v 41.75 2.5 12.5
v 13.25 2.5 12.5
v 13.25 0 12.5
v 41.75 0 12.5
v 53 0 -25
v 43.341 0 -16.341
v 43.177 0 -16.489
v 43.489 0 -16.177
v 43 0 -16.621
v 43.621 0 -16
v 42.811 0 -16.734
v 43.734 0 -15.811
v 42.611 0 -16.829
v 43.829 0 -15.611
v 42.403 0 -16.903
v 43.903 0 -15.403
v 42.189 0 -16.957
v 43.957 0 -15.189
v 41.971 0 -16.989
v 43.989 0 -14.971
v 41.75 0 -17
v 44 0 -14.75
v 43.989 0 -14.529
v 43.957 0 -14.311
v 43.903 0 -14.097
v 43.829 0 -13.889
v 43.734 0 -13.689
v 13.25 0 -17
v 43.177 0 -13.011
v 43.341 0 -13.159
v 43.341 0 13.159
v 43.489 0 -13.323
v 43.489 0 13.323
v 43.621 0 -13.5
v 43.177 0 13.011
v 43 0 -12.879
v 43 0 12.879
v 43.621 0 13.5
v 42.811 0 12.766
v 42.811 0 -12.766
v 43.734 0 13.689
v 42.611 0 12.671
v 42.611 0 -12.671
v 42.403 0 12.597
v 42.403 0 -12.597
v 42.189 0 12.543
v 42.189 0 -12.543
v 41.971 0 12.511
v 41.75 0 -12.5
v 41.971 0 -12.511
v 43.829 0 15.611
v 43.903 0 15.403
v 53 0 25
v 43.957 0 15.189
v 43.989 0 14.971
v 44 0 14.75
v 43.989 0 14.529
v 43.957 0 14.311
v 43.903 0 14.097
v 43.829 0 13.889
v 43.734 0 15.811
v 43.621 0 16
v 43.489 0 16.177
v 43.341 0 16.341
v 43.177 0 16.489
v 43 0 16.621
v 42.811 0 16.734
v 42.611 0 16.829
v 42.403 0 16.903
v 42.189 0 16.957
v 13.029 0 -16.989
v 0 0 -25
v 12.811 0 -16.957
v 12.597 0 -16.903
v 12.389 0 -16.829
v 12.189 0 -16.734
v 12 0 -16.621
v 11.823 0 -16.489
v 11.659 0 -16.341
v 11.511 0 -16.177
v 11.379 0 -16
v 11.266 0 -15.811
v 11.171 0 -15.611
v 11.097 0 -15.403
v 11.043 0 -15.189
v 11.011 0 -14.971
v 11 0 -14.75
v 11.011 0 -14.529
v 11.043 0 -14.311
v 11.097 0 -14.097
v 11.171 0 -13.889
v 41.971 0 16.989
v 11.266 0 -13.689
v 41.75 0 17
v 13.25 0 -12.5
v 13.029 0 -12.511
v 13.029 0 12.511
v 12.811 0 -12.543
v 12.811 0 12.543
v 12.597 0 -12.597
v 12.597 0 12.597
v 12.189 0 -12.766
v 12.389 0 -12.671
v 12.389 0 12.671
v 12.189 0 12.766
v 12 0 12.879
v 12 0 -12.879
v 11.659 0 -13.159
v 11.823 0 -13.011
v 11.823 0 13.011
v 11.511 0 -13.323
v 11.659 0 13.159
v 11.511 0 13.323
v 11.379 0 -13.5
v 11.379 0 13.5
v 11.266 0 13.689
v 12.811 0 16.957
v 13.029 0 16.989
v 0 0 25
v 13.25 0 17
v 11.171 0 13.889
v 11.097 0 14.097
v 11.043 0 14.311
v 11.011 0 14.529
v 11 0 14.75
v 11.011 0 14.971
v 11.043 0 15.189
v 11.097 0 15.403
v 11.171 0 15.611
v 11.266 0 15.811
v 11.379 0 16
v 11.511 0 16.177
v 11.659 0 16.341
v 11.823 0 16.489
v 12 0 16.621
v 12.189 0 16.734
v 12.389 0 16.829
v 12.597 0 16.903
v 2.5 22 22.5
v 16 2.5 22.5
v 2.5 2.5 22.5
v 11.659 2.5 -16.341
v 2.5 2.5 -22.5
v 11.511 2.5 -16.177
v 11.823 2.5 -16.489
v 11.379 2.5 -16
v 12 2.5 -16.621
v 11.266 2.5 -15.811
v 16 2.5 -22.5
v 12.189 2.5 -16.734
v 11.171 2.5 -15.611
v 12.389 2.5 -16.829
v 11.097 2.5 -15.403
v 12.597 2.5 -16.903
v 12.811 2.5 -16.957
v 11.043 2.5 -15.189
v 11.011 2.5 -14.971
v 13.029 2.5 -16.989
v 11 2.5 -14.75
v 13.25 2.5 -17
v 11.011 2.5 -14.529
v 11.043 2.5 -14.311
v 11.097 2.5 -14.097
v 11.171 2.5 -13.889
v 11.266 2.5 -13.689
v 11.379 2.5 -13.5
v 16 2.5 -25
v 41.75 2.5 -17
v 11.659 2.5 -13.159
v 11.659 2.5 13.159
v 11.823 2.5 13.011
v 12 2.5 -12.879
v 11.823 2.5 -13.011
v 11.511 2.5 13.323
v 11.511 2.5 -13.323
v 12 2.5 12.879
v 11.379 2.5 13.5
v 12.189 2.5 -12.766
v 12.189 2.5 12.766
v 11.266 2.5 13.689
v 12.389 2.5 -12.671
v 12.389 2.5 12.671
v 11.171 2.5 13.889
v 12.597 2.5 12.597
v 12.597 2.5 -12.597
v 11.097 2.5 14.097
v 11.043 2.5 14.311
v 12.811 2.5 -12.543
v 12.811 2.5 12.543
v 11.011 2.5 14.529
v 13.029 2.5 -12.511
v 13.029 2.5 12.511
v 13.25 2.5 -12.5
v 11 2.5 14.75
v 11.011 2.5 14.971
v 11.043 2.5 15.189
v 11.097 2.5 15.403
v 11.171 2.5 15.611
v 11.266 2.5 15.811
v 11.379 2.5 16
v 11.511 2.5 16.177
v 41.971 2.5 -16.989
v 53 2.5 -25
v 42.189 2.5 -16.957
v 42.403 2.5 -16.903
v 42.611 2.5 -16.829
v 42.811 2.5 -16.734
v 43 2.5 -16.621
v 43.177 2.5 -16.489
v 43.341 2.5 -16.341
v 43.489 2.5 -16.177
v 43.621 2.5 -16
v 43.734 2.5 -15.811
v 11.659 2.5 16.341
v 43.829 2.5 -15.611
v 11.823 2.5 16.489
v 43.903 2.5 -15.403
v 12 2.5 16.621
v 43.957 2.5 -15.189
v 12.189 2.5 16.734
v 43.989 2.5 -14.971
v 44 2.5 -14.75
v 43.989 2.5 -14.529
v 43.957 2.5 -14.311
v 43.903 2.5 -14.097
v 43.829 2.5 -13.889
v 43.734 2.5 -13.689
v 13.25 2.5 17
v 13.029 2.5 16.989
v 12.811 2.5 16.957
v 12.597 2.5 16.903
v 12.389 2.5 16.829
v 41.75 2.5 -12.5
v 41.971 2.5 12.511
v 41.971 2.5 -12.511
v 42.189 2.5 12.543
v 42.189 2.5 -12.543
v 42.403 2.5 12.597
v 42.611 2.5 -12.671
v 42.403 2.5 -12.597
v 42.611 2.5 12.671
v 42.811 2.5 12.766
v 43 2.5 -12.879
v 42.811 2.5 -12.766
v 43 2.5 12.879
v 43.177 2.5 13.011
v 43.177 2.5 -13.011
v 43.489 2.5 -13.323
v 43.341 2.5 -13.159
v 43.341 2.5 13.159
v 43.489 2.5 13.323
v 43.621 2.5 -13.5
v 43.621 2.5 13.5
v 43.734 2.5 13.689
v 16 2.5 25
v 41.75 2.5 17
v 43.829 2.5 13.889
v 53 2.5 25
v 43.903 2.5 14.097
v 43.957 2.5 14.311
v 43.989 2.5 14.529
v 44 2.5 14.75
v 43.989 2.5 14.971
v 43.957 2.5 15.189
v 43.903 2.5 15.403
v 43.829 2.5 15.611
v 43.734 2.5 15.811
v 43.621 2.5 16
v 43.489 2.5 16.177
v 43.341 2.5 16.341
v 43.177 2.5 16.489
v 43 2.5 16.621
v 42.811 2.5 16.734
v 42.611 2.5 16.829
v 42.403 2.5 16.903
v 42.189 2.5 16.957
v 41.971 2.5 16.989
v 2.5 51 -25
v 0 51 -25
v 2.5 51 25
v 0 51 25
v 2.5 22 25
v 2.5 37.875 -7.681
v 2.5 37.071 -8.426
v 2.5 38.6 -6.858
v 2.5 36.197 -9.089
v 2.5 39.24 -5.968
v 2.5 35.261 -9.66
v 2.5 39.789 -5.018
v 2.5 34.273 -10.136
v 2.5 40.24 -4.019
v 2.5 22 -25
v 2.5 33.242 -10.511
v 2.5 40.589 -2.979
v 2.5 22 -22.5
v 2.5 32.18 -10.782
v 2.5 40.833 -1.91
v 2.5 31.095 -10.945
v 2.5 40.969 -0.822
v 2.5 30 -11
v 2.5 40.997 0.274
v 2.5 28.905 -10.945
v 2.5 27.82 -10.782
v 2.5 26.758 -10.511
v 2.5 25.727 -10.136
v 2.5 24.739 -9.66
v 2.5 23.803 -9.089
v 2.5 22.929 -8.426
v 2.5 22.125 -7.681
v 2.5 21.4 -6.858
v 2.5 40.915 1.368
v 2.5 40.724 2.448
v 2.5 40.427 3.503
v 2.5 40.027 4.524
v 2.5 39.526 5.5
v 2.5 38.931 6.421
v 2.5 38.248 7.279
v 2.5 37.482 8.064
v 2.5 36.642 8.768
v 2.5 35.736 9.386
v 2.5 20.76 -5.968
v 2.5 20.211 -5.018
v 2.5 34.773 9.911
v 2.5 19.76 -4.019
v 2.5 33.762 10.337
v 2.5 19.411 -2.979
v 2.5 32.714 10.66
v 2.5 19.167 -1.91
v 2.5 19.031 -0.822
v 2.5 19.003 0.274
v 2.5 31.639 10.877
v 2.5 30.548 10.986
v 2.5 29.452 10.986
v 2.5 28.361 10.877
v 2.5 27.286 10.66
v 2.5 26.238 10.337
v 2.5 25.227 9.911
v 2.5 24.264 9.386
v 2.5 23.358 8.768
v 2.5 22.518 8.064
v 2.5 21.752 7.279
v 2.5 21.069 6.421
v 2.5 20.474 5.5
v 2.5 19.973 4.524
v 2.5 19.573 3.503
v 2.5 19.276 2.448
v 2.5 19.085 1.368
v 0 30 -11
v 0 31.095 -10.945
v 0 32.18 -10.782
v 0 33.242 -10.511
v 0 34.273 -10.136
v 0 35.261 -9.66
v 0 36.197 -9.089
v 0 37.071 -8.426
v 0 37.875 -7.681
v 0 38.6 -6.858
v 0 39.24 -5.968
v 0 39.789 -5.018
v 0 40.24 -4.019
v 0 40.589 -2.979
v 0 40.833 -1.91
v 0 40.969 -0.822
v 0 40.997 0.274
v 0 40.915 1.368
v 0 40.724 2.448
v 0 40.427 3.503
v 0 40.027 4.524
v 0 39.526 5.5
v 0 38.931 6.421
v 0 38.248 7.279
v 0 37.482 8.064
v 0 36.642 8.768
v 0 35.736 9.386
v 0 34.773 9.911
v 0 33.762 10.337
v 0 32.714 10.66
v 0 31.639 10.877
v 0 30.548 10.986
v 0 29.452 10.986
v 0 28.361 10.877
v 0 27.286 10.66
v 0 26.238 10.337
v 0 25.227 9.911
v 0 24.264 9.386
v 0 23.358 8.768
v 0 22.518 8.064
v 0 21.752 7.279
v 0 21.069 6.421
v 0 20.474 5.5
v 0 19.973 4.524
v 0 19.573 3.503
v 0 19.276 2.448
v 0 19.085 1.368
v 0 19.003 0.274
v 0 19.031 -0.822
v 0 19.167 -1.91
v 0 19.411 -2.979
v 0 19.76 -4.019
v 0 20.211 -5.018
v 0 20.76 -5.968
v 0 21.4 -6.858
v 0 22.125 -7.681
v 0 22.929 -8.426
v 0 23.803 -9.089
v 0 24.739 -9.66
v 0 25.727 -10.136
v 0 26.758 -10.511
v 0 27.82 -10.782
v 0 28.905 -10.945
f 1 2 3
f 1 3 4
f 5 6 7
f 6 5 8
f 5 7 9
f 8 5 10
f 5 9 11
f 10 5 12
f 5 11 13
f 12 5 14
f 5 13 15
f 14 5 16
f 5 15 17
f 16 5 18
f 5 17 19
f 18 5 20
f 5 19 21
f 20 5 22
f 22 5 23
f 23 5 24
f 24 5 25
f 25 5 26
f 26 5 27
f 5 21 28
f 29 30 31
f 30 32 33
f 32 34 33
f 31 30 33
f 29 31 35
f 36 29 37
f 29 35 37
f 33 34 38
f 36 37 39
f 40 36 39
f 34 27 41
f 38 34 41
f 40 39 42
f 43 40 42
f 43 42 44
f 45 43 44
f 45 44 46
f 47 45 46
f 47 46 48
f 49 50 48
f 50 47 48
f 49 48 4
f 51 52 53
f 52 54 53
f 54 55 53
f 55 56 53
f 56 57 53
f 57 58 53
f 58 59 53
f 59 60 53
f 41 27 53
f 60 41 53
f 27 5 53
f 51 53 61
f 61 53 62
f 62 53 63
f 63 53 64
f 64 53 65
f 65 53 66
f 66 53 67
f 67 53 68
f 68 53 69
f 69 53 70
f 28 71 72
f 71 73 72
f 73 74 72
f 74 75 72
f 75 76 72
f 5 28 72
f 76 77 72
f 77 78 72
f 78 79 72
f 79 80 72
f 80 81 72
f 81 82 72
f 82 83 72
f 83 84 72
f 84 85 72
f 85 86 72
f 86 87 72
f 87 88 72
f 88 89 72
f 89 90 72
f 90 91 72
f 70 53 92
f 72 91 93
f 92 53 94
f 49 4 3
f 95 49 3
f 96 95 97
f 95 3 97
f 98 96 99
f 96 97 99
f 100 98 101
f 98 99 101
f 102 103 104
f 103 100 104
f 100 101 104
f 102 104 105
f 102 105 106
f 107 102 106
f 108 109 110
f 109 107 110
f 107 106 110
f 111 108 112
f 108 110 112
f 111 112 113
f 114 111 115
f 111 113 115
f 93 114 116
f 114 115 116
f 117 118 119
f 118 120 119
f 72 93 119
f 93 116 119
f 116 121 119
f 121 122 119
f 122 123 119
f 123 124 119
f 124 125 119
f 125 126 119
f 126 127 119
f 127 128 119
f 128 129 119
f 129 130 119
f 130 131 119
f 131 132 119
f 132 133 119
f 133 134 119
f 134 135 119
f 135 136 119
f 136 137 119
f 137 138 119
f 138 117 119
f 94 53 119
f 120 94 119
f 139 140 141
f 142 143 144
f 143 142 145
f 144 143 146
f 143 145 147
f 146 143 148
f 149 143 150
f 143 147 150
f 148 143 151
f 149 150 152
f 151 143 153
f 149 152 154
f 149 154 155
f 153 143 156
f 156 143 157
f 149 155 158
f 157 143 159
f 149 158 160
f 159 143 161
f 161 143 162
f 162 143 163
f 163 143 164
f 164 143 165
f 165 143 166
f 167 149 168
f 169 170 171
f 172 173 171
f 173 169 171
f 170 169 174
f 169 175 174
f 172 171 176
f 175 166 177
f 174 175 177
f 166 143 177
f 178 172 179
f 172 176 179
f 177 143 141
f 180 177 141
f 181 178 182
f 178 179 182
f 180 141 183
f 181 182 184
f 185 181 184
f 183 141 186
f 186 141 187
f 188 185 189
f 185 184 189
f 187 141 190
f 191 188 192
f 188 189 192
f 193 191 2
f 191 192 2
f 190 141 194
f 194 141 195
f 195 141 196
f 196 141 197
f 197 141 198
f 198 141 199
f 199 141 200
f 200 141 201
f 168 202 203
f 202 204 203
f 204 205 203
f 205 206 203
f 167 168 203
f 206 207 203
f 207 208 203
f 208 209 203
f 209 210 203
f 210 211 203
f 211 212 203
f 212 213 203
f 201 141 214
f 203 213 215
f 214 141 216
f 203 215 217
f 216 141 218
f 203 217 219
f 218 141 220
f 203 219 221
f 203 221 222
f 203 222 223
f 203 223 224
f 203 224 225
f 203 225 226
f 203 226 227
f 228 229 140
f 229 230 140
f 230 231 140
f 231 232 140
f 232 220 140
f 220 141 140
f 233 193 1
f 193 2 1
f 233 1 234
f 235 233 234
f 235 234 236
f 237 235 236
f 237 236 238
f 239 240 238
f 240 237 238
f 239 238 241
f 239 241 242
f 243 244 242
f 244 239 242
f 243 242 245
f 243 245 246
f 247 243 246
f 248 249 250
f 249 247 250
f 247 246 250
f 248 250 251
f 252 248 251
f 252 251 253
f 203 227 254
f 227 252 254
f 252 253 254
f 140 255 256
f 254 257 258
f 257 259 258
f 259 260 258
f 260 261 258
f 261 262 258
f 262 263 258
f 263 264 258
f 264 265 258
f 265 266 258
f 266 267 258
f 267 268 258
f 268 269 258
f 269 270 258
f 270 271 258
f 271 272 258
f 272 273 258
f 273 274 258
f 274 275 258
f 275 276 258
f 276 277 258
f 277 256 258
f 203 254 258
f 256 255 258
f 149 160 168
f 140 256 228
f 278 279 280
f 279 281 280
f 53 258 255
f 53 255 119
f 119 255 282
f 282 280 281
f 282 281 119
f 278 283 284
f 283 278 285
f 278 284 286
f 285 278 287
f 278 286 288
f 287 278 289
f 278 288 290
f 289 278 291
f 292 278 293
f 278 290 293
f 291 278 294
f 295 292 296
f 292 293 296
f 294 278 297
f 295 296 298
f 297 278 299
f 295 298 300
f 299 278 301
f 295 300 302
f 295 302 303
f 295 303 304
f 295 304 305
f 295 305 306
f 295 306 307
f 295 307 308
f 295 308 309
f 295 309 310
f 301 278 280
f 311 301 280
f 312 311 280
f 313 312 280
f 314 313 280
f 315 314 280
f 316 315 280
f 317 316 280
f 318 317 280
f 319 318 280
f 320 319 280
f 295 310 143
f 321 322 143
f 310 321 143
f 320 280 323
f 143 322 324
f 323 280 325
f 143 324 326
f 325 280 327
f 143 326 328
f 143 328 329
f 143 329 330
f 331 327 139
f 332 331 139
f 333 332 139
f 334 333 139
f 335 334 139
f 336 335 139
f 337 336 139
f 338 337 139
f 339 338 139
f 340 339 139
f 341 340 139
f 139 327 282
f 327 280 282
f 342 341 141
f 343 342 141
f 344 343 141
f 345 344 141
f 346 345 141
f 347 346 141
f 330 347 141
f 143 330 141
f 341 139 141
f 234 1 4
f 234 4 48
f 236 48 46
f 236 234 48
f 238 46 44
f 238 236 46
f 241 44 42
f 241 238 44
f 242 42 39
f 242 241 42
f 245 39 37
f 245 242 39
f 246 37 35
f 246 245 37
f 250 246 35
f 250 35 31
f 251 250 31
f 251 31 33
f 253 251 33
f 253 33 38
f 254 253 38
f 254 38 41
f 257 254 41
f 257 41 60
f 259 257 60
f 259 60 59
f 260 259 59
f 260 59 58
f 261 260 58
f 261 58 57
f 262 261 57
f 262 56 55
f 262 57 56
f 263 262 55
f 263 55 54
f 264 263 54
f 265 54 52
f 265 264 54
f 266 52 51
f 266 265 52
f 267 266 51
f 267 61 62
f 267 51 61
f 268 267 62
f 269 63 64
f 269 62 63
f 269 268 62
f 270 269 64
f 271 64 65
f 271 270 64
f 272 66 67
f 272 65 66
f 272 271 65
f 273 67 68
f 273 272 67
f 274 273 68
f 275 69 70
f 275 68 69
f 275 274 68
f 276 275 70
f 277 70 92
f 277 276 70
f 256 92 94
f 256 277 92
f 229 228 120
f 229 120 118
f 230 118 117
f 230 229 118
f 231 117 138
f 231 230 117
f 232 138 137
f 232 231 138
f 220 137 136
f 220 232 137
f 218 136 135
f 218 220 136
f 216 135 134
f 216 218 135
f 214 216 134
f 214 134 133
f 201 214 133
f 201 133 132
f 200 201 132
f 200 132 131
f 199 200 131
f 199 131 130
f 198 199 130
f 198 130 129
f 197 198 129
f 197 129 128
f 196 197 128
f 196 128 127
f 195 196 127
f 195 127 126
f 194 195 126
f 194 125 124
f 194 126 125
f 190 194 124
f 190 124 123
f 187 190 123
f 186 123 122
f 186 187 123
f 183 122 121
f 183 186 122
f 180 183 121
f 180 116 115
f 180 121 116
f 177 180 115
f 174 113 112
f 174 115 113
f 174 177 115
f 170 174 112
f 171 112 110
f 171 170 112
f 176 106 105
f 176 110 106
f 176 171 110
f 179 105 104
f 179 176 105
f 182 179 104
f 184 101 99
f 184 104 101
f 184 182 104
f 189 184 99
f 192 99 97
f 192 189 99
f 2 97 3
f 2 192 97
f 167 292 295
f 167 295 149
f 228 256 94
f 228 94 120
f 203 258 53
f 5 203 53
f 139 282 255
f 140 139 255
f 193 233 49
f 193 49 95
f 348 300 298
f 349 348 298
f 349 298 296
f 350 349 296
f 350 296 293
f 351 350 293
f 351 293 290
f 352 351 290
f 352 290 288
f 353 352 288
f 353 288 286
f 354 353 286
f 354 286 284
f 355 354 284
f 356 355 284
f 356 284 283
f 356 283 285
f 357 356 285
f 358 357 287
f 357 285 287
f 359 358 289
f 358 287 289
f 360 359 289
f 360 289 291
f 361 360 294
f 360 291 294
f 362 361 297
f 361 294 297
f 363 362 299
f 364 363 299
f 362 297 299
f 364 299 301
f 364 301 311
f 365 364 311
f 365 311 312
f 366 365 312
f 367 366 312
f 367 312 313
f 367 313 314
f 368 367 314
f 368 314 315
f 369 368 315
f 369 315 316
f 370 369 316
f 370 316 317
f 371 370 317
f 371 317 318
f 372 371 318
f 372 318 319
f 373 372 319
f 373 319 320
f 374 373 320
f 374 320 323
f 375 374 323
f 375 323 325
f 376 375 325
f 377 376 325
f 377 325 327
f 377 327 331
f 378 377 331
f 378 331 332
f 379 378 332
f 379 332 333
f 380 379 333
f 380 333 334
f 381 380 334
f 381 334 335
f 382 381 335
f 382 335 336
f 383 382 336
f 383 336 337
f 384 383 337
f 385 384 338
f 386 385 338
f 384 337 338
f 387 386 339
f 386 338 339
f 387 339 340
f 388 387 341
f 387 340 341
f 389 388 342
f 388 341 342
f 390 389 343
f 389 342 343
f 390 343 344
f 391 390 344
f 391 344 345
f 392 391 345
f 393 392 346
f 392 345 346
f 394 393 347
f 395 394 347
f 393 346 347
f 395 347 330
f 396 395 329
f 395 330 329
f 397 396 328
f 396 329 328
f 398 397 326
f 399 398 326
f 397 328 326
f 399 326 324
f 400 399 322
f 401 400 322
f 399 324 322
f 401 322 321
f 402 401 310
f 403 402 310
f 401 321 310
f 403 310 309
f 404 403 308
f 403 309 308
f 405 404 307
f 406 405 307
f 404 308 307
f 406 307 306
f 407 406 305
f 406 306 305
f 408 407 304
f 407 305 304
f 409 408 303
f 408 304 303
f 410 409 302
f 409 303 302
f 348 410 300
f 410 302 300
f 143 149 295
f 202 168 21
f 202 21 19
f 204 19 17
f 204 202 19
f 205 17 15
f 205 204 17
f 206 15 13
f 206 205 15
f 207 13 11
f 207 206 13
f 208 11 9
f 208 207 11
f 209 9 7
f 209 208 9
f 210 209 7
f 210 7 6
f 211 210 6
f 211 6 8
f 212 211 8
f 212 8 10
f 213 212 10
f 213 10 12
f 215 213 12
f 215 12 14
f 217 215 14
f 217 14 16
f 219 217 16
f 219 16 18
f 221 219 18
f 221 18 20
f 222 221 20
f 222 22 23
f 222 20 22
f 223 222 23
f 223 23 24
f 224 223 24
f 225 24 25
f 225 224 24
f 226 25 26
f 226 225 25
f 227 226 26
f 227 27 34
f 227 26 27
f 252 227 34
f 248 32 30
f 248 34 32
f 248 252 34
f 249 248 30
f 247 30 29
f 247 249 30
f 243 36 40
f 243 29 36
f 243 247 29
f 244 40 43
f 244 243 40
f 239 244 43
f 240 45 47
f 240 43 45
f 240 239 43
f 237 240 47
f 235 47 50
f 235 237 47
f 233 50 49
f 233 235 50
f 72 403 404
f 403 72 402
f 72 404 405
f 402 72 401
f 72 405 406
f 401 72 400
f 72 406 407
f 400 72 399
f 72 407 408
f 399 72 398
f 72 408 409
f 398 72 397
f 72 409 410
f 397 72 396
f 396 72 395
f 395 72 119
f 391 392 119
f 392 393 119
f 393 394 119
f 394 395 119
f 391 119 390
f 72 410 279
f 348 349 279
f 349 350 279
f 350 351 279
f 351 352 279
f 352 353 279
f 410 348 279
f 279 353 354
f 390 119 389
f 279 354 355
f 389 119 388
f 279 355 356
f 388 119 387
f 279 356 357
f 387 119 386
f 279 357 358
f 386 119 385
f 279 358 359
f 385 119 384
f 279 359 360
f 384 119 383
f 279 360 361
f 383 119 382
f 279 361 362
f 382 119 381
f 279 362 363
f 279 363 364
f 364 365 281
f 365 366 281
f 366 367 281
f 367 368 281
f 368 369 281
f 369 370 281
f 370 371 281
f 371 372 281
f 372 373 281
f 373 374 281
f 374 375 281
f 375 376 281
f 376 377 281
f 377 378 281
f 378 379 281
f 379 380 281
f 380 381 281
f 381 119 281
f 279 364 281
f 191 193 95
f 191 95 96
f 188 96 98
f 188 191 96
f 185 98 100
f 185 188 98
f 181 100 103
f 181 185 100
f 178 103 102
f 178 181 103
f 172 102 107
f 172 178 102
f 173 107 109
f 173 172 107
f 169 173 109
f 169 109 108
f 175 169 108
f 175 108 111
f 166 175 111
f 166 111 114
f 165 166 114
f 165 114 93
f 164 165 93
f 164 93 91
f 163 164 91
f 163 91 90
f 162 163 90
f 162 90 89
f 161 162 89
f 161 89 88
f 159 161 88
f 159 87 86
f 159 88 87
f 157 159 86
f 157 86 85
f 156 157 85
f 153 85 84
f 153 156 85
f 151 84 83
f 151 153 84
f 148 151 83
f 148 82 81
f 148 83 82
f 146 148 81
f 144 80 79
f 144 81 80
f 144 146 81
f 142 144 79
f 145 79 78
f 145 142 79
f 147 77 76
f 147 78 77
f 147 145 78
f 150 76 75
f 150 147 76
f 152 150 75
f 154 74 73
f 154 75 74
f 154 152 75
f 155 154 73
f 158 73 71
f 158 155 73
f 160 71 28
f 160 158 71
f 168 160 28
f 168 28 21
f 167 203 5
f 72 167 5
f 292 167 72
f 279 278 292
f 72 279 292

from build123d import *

# Parameters (mm, degrees)
BOSS_EXTRUDE1_DEPTH = 25
CUT_EXTRUDE1_DEPTH  = 10
SKETCH6_R           = 11
CUT_EXTRUDE2_DEPTH  = 10
BOSS_EXTRUDE2_DEPTH = 2.5


with BuildPart() as part:
    # Sketch1 → Boss-Extrude1 (new body, symmetric)
    with BuildSketch(Plane.XY):
        Polygon((53, 0), (0, 0), (0, 51), (2.5, 51), (2.5, 2.5), (53, 2.5), align=None)
    extrude(amount=BOSS_EXTRUDE1_DEPTH, both=True)

    # Sketch5 → Cut-Extrude1 (cut)
    with BuildSketch(Plane(origin=(0, 2.5, 0), x_dir=(1, 0, 0), z_dir=(0, 1, 0))):
        with BuildLine():
            Line((13.25, 17), (41.75, 17))
            ThreePointArc((41.75, 17), (44, 14.75), (41.75, 12.5))
            Line((41.75, 12.5), (13.25, 12.5))
            ThreePointArc((13.25, 12.5), (11, 14.75), (13.25, 17))
        make_face()
        with BuildLine():
            Line((13.25, -12.5), (41.75, -12.5))
            ThreePointArc((41.75, -12.5), (44, -14.75), (41.75, -17))
            Line((41.75, -17), (13.25, -17))
            ThreePointArc((13.25, -17), (11, -14.75), (13.25, -12.5))
        make_face()
    extrude(amount=-CUT_EXTRUDE1_DEPTH, mode=Mode.SUBTRACT)

    # Sketch6 → Cut-Extrude2 (cut)
    with BuildSketch(Plane(origin=(2.5, 0, 0), x_dir=(0, 0, -1), z_dir=(1, 0, 0))):
        with Locations((0, 30)):
            Circle(SKETCH6_R)
    extrude(amount=-CUT_EXTRUDE2_DEPTH, mode=Mode.SUBTRACT)

    # Sketch7 → Boss-Extrude2 (add)
    with BuildSketch(Plane.XY.offset(25)):
        Polygon((2.5, 22), (16, 2.5), (2.5, 2.5), align=None)
    boss_extrude2 = extrude(amount=-BOSS_EXTRUDE2_DEPTH)

    # Mirror1: Boss-Extrude2 across plane
    add(boss_extrude2.mirror(Plane.XY))


solid = part.part
